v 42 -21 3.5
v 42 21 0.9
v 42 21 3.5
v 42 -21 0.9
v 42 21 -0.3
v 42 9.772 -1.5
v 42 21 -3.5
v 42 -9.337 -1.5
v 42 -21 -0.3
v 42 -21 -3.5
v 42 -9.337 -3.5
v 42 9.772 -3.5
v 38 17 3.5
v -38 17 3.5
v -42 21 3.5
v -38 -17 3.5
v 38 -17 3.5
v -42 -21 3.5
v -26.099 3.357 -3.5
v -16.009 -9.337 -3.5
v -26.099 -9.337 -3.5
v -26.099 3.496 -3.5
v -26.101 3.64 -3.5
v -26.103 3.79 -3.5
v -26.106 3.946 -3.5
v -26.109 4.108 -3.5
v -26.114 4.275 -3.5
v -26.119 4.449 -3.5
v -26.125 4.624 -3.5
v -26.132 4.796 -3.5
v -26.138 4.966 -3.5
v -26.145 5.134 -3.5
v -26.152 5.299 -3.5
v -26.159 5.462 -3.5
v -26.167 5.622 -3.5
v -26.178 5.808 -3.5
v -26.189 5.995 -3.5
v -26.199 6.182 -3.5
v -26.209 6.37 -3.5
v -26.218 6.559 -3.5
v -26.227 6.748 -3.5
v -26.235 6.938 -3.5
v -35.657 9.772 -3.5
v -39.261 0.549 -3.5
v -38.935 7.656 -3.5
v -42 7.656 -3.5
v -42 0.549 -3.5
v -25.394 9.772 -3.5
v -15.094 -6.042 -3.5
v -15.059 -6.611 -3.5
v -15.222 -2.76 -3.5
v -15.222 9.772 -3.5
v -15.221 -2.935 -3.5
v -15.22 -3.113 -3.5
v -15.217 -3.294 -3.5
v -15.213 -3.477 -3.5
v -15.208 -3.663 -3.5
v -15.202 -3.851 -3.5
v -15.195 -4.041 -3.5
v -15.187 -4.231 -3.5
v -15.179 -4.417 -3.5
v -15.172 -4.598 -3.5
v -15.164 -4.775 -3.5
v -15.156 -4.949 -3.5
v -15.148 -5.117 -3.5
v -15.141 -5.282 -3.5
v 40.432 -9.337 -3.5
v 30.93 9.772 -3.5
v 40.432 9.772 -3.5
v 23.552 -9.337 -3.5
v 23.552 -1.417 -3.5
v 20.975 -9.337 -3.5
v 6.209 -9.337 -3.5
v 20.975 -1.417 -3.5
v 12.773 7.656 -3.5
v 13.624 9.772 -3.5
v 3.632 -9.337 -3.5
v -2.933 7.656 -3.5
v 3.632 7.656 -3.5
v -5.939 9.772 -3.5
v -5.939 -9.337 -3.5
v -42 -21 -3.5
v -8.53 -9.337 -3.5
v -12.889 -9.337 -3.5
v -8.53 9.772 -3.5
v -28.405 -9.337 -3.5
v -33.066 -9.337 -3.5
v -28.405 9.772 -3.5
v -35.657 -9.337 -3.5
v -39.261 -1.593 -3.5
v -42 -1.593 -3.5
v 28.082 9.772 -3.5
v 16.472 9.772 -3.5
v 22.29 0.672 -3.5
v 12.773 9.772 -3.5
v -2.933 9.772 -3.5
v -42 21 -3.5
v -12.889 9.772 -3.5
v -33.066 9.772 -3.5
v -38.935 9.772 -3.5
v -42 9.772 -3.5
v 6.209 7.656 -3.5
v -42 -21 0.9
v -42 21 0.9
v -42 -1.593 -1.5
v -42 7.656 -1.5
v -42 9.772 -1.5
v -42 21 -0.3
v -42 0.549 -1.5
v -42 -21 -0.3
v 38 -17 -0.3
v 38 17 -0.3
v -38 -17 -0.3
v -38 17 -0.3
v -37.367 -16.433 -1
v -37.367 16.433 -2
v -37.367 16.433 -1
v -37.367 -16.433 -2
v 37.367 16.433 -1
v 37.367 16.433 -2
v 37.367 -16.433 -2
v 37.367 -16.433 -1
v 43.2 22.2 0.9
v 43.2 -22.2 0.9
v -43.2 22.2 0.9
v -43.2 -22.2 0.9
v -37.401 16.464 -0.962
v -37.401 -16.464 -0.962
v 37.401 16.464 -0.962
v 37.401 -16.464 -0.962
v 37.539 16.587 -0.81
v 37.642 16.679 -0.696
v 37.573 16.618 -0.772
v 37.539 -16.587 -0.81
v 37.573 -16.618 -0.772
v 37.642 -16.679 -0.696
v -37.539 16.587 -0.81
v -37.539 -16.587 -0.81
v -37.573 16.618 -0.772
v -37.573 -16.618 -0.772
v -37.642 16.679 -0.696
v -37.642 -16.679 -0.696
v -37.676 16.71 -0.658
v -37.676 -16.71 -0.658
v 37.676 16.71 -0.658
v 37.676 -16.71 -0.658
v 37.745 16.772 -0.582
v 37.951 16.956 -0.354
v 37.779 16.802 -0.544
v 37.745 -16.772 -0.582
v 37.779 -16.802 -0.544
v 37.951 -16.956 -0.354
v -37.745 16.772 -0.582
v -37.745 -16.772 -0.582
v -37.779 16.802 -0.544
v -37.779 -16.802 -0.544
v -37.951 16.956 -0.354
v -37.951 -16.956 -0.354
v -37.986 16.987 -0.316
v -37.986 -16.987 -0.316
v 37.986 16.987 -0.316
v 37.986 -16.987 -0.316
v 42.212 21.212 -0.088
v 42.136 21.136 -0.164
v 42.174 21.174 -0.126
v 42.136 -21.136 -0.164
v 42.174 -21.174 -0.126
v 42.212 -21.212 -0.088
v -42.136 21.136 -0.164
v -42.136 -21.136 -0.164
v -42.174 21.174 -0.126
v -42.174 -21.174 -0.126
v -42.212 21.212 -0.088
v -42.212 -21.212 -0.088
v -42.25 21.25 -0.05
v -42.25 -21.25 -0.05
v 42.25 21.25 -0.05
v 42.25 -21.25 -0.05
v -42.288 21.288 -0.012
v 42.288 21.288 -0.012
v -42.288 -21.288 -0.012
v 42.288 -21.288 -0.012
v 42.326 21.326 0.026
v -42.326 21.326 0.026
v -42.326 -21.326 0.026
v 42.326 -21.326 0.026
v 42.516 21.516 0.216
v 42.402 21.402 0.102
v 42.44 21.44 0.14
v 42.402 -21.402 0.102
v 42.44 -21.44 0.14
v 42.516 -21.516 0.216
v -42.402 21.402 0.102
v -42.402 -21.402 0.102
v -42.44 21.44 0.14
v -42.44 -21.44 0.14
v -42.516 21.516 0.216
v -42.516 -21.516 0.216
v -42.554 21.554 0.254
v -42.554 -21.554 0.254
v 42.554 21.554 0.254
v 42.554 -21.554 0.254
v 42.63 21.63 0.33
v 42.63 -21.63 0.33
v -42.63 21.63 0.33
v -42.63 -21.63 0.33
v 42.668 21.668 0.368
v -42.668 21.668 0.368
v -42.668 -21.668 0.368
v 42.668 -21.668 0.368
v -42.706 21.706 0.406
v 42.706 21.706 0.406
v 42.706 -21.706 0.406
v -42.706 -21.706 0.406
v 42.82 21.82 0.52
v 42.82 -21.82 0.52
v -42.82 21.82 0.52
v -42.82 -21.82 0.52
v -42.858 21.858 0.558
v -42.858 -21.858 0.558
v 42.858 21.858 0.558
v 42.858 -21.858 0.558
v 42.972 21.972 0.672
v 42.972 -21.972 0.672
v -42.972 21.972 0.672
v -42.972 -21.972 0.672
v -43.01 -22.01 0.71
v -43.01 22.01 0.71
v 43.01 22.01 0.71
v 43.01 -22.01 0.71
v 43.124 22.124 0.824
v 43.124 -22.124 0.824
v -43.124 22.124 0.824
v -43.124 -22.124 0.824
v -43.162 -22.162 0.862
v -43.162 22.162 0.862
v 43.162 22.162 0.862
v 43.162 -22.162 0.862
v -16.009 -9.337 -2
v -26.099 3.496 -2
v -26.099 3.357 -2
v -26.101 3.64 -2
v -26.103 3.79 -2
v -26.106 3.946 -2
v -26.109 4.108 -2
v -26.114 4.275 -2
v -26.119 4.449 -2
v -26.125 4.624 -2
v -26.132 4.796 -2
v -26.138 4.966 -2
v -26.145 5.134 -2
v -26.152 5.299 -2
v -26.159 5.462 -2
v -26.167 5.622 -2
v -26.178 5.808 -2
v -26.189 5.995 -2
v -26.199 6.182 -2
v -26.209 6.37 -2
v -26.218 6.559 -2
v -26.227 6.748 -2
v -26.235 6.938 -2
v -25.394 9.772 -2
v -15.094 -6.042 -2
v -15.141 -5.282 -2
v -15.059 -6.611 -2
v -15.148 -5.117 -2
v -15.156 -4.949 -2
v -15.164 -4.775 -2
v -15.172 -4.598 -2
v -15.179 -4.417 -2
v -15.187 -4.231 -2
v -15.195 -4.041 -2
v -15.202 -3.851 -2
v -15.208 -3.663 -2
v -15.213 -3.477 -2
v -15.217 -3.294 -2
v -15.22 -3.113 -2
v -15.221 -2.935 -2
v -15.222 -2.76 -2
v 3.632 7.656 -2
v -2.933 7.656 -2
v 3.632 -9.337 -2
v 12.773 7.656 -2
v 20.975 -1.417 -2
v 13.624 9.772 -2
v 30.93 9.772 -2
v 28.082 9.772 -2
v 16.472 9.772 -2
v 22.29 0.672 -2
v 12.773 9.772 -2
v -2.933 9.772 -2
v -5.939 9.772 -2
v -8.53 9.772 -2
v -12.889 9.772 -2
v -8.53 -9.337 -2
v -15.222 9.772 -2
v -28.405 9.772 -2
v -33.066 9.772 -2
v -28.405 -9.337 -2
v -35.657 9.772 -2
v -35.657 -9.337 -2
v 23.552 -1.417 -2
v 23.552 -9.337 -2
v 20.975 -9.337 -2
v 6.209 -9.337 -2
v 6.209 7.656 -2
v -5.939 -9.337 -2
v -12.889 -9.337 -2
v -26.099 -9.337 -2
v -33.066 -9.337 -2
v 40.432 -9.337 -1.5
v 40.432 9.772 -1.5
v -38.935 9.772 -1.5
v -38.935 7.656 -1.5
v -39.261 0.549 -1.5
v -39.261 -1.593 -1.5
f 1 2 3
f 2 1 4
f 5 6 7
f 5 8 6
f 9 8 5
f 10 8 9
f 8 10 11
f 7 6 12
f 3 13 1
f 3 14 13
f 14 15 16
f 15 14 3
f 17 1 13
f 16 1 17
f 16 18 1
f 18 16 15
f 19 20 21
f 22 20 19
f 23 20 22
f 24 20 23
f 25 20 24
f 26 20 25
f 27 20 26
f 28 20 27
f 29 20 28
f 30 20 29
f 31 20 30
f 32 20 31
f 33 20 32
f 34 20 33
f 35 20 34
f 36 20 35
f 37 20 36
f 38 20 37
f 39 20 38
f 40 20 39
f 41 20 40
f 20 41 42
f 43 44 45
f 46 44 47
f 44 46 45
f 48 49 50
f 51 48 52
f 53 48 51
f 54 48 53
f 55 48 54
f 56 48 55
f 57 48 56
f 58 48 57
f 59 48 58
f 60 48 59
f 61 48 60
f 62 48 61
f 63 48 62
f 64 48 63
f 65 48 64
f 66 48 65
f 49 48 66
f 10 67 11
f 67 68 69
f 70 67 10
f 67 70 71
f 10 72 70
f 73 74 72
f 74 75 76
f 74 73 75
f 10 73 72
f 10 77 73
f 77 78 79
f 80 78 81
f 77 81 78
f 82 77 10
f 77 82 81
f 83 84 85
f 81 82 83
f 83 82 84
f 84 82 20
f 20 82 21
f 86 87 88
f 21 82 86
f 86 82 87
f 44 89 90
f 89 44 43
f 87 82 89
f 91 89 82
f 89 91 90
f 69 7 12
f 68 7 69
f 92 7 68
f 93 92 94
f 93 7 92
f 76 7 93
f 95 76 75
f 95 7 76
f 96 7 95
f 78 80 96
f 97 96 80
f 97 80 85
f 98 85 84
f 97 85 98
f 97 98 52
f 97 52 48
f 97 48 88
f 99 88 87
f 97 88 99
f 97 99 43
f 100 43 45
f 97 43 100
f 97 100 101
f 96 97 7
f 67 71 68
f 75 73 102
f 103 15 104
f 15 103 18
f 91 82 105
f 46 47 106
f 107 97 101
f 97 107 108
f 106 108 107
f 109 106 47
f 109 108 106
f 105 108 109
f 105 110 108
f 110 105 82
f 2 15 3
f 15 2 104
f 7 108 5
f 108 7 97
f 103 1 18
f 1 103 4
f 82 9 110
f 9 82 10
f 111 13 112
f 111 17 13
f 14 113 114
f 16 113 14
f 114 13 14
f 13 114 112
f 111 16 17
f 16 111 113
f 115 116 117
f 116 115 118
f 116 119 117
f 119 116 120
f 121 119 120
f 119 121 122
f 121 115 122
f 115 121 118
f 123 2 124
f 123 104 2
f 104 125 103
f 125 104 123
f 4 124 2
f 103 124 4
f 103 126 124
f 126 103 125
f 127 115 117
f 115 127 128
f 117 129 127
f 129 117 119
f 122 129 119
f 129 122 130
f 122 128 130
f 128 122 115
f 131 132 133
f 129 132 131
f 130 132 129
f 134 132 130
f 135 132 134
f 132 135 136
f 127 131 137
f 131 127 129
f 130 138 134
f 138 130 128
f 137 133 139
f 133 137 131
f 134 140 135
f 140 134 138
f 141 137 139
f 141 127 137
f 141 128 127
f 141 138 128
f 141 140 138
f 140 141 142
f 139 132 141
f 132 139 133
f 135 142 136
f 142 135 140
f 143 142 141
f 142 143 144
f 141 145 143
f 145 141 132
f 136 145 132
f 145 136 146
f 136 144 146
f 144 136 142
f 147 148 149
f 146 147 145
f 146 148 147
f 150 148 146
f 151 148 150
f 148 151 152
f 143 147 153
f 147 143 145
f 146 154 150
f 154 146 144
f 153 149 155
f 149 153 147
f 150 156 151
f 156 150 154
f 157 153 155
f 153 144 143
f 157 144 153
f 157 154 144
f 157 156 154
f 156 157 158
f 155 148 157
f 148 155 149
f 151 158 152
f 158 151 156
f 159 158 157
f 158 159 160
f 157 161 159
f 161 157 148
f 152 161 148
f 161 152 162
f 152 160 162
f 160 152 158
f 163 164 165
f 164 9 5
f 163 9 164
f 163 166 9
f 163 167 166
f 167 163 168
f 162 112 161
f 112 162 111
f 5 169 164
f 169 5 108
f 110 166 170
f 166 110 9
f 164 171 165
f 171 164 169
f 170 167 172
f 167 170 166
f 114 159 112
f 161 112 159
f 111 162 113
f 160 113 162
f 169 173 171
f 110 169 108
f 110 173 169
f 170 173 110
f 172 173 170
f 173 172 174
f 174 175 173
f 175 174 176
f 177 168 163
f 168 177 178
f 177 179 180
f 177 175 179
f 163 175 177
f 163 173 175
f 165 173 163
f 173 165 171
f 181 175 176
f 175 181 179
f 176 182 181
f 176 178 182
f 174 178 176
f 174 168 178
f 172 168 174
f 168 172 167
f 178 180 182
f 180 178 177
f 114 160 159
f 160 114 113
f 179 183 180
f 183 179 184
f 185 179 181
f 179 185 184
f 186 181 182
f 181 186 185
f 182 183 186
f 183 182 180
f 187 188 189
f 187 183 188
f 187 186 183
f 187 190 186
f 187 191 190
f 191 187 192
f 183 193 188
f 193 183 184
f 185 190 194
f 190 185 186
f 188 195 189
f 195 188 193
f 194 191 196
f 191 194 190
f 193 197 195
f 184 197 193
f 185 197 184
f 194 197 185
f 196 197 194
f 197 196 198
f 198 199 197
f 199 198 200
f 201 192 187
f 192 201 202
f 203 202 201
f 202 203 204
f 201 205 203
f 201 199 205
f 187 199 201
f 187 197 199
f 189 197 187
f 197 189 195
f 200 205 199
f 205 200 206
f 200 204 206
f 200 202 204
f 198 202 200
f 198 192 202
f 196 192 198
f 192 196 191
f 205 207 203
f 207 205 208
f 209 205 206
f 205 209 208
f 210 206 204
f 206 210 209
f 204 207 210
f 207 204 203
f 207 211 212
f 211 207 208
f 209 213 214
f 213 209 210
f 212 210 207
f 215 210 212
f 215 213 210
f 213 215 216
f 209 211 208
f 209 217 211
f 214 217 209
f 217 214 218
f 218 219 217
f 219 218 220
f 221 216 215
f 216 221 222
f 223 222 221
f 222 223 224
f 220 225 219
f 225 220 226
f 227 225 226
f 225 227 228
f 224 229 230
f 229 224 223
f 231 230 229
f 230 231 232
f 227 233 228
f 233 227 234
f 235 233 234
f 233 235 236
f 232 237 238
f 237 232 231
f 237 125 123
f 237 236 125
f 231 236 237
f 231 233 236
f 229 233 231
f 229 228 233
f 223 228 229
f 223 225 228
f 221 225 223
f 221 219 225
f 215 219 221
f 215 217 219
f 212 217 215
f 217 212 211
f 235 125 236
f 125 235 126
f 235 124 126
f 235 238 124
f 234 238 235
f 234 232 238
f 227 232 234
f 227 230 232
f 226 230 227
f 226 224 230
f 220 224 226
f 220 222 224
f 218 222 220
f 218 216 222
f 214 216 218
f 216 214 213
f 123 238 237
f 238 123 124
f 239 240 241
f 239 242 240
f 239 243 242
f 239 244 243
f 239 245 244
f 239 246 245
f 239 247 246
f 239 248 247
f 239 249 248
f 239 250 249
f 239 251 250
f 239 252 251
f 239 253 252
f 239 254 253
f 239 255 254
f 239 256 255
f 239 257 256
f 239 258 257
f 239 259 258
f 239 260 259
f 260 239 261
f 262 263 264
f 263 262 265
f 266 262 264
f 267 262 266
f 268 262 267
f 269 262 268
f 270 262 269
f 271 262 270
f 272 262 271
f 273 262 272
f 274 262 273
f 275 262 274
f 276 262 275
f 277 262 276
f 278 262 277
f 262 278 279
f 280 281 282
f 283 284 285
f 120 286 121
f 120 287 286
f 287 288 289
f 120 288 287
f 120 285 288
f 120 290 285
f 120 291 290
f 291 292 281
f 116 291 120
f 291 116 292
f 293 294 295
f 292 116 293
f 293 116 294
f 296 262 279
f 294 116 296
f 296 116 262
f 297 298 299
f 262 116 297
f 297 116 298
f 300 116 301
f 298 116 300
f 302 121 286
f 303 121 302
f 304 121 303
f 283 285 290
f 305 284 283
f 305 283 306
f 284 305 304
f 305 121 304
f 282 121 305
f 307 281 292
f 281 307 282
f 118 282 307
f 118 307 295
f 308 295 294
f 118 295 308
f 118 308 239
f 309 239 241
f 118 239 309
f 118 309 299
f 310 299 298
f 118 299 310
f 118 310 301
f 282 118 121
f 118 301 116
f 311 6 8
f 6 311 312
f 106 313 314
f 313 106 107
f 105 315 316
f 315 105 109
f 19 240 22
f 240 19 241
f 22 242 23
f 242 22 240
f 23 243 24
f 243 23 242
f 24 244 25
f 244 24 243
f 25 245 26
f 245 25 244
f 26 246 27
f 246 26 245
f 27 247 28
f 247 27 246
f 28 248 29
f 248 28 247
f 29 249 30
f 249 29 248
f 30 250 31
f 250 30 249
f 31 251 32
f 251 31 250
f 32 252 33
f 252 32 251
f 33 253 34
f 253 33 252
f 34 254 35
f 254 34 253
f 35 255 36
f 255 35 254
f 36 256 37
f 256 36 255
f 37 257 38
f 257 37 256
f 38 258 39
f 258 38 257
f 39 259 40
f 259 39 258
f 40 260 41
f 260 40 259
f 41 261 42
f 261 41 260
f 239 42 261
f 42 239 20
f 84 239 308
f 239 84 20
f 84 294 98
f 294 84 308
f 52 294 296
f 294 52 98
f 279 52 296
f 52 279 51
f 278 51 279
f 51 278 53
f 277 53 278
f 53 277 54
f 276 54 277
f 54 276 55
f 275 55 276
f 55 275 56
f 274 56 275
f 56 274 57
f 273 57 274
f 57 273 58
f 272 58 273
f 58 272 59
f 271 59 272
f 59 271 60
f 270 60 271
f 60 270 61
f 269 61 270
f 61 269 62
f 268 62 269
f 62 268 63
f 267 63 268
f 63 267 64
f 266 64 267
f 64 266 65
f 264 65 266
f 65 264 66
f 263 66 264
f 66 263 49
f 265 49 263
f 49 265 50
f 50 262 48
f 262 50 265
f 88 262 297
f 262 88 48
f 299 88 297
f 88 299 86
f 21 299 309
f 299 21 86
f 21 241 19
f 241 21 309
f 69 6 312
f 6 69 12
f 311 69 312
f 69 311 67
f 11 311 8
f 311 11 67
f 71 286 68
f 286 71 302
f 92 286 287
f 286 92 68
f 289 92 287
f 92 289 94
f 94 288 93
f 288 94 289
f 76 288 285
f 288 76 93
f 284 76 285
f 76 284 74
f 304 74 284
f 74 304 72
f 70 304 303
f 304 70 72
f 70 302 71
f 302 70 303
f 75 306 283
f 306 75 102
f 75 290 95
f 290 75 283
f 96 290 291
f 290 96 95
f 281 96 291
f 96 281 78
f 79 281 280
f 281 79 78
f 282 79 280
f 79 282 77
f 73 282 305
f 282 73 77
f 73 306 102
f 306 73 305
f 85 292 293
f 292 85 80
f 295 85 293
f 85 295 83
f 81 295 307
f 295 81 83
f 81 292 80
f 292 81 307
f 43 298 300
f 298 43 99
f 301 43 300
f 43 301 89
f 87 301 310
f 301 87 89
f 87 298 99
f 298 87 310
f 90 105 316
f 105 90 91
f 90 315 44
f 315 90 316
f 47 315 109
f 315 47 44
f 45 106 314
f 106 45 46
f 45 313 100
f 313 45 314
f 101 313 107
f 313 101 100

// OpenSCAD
$fn = 50;
//Number of grid units in X direction
grid_x = 2; //[1:10]
//Number of grid units in Y direction
grid_y = 1; //[1:10]
//Text to display on the label
label_text = "GRIDFINITY LABEL";
//Size of the text
text_size = 20; //[5:50]
//0: Engraved text, 1: Raised text
text_style = 0; //[0, 1]

union() {
	scale(v = [(1 - text_style), (1 - text_style), (1 - text_style)]) {
		difference() {
			union() {
				difference() {
					translate(v = [((-(grid_x * 42)) / 2), ((-(grid_y * 42)) / 2), -3.5]) {
						cube(size = [(grid_x * 42), (grid_y * 42), 7]);
					}
					translate(v = [((-((grid_x * 42) - 8)) / 2), ((-((grid_y * 42) - 8)) / 2), -3.5]) {
						cube(size = [((grid_x * 42) - 8), ((grid_y * 42) - 8), 7]);
					}
				}
				union() {
					translate(v = [0, 0, -2.8]) {
						linear_extrude(height = 1.8) {
							difference() {
								square(center = true, size = [((grid_x * 42) * (((grid_x * 42) - 1.3999999999999997) / (grid_x * 42))), ((grid_y * 42) * (((grid_y * 42) - 1.3999999999999997) / (grid_y * 42)))]);
								square(center = true, size = [(((grid_x * 42) - 8) * (((grid_x * 42) - 1.3999999999999997) / (grid_x * 42))), (((grid_y * 42) - 8) * (((grid_y * 42) - 1.3999999999999997) / (grid_y * 42)))]);
							}
						}
					}
					translate(v = [0, 0, -0.9999999999999998]) {
						linear_extrude(height = 1.9, scale = [((((grid_x * 42) - 1.3999999999999997) + 3.7999999999999994) / ((grid_x * 42) - 1.3999999999999997)), ((((grid_y * 42) - 1.3999999999999997) + 3.7999999999999994) / ((grid_y * 42) - 1.3999999999999997))]) {
							difference() {
								square(center = true, size = [((grid_x * 42) * (((grid_x * 42) - 1.3999999999999997) / (grid_x * 42))), ((grid_y * 42) * (((grid_y * 42) - 1.3999999999999997) / (grid_y * 42)))]);
								square(center = true, size = [(((grid_x * 42) - 8) * (((grid_x * 42) - 1.3999999999999997) / (grid_x * 42))), (((grid_y * 42) - 8) * (((grid_y * 42) - 1.3999999999999997) / (grid_y * 42)))]);
							}
						}
					}
				}
				translate(v = [((-((grid_x * 42) - 8)) / 2), ((-((grid_y * 42) - 8)) / 2), -3.5]) {
					cube(size = [((grid_x * 42) - 8), ((grid_y * 42) - 8), 1.5]);
				}
			}
			translate(v = [0, 0, -4.0]) {
				linear_extrude(height = 2.5) {
					text(halign = "center", size = text_size, text = label_text, valign = "center");
				}
			}
		}
	}
	scale(v = [text_style, text_style, text_style]) {
		union() {
			difference() {
				translate(v = [((-(grid_x * 42)) / 2), ((-(grid_y * 42)) / 2), -3.5]) {
					cube(size = [(grid_x * 42), (grid_y * 42), 7]);
				}
				translate(v = [((-((grid_x * 42) - 8)) / 2), ((-((grid_y * 42) - 8)) / 2), -3.5]) {
					cube(size = [((grid_x * 42) - 8), ((grid_y * 42) - 8), 7]);
				}
			}
			union() {
				translate(v = [0, 0, -2.8]) {
					linear_extrude(height = 1.8) {
						difference() {
							square(center = true, size = [((grid_x * 42) * (((grid_x * 42) - 1.3999999999999997) / (grid_x * 42))), ((grid_y * 42) * (((grid_y * 42) - 1.3999999999999997) / (grid_y * 42)))]);
							square(center = true, size = [(((grid_x * 42) - 8) * (((grid_x * 42) - 1.3999999999999997) / (grid_x * 42))), (((grid_y * 42) - 8) * (((grid_y * 42) - 1.3999999999999997) / (grid_y * 42)))]);
						}
					}
				}
				translate(v = [0, 0, -0.9999999999999998]) {
					linear_extrude(height = 1.9, scale = [((((grid_x * 42) - 1.3999999999999997) + 3.7999999999999994) / ((grid_x * 42) - 1.3999999999999997)), ((((grid_y * 42) - 1.3999999999999997) + 3.7999999999999994) / ((grid_y * 42) - 1.3999999999999997))]) {
						difference() {
							square(center = true, size = [((grid_x * 42) * (((grid_x * 42) - 1.3999999999999997) / (grid_x * 42))), ((grid_y * 42) * (((grid_y * 42) - 1.3999999999999997) / (grid_y * 42)))]);
							square(center = true, size = [(((grid_x * 42) - 8) * (((grid_x * 42) - 1.3999999999999997) / (grid_x * 42))), (((grid_y * 42) - 8) * (((grid_y * 42) - 1.3999999999999997) / (grid_y * 42)))]);
						}
					}
				}
			}
			translate(v = [((-((grid_x * 42) - 8)) / 2), ((-((grid_y * 42) - 8)) / 2), -3.5]) {
				cube(size = [((grid_x * 42) - 8), ((grid_y * 42) - 8), 1.5]);
			}
			translate(v = [0, 0, -2.0]) {
				linear_extrude(height = 1.5) {
					text(halign = "center", size = text_size, text = label_text, valign = "center");
				}
			}
		}
	}
}
